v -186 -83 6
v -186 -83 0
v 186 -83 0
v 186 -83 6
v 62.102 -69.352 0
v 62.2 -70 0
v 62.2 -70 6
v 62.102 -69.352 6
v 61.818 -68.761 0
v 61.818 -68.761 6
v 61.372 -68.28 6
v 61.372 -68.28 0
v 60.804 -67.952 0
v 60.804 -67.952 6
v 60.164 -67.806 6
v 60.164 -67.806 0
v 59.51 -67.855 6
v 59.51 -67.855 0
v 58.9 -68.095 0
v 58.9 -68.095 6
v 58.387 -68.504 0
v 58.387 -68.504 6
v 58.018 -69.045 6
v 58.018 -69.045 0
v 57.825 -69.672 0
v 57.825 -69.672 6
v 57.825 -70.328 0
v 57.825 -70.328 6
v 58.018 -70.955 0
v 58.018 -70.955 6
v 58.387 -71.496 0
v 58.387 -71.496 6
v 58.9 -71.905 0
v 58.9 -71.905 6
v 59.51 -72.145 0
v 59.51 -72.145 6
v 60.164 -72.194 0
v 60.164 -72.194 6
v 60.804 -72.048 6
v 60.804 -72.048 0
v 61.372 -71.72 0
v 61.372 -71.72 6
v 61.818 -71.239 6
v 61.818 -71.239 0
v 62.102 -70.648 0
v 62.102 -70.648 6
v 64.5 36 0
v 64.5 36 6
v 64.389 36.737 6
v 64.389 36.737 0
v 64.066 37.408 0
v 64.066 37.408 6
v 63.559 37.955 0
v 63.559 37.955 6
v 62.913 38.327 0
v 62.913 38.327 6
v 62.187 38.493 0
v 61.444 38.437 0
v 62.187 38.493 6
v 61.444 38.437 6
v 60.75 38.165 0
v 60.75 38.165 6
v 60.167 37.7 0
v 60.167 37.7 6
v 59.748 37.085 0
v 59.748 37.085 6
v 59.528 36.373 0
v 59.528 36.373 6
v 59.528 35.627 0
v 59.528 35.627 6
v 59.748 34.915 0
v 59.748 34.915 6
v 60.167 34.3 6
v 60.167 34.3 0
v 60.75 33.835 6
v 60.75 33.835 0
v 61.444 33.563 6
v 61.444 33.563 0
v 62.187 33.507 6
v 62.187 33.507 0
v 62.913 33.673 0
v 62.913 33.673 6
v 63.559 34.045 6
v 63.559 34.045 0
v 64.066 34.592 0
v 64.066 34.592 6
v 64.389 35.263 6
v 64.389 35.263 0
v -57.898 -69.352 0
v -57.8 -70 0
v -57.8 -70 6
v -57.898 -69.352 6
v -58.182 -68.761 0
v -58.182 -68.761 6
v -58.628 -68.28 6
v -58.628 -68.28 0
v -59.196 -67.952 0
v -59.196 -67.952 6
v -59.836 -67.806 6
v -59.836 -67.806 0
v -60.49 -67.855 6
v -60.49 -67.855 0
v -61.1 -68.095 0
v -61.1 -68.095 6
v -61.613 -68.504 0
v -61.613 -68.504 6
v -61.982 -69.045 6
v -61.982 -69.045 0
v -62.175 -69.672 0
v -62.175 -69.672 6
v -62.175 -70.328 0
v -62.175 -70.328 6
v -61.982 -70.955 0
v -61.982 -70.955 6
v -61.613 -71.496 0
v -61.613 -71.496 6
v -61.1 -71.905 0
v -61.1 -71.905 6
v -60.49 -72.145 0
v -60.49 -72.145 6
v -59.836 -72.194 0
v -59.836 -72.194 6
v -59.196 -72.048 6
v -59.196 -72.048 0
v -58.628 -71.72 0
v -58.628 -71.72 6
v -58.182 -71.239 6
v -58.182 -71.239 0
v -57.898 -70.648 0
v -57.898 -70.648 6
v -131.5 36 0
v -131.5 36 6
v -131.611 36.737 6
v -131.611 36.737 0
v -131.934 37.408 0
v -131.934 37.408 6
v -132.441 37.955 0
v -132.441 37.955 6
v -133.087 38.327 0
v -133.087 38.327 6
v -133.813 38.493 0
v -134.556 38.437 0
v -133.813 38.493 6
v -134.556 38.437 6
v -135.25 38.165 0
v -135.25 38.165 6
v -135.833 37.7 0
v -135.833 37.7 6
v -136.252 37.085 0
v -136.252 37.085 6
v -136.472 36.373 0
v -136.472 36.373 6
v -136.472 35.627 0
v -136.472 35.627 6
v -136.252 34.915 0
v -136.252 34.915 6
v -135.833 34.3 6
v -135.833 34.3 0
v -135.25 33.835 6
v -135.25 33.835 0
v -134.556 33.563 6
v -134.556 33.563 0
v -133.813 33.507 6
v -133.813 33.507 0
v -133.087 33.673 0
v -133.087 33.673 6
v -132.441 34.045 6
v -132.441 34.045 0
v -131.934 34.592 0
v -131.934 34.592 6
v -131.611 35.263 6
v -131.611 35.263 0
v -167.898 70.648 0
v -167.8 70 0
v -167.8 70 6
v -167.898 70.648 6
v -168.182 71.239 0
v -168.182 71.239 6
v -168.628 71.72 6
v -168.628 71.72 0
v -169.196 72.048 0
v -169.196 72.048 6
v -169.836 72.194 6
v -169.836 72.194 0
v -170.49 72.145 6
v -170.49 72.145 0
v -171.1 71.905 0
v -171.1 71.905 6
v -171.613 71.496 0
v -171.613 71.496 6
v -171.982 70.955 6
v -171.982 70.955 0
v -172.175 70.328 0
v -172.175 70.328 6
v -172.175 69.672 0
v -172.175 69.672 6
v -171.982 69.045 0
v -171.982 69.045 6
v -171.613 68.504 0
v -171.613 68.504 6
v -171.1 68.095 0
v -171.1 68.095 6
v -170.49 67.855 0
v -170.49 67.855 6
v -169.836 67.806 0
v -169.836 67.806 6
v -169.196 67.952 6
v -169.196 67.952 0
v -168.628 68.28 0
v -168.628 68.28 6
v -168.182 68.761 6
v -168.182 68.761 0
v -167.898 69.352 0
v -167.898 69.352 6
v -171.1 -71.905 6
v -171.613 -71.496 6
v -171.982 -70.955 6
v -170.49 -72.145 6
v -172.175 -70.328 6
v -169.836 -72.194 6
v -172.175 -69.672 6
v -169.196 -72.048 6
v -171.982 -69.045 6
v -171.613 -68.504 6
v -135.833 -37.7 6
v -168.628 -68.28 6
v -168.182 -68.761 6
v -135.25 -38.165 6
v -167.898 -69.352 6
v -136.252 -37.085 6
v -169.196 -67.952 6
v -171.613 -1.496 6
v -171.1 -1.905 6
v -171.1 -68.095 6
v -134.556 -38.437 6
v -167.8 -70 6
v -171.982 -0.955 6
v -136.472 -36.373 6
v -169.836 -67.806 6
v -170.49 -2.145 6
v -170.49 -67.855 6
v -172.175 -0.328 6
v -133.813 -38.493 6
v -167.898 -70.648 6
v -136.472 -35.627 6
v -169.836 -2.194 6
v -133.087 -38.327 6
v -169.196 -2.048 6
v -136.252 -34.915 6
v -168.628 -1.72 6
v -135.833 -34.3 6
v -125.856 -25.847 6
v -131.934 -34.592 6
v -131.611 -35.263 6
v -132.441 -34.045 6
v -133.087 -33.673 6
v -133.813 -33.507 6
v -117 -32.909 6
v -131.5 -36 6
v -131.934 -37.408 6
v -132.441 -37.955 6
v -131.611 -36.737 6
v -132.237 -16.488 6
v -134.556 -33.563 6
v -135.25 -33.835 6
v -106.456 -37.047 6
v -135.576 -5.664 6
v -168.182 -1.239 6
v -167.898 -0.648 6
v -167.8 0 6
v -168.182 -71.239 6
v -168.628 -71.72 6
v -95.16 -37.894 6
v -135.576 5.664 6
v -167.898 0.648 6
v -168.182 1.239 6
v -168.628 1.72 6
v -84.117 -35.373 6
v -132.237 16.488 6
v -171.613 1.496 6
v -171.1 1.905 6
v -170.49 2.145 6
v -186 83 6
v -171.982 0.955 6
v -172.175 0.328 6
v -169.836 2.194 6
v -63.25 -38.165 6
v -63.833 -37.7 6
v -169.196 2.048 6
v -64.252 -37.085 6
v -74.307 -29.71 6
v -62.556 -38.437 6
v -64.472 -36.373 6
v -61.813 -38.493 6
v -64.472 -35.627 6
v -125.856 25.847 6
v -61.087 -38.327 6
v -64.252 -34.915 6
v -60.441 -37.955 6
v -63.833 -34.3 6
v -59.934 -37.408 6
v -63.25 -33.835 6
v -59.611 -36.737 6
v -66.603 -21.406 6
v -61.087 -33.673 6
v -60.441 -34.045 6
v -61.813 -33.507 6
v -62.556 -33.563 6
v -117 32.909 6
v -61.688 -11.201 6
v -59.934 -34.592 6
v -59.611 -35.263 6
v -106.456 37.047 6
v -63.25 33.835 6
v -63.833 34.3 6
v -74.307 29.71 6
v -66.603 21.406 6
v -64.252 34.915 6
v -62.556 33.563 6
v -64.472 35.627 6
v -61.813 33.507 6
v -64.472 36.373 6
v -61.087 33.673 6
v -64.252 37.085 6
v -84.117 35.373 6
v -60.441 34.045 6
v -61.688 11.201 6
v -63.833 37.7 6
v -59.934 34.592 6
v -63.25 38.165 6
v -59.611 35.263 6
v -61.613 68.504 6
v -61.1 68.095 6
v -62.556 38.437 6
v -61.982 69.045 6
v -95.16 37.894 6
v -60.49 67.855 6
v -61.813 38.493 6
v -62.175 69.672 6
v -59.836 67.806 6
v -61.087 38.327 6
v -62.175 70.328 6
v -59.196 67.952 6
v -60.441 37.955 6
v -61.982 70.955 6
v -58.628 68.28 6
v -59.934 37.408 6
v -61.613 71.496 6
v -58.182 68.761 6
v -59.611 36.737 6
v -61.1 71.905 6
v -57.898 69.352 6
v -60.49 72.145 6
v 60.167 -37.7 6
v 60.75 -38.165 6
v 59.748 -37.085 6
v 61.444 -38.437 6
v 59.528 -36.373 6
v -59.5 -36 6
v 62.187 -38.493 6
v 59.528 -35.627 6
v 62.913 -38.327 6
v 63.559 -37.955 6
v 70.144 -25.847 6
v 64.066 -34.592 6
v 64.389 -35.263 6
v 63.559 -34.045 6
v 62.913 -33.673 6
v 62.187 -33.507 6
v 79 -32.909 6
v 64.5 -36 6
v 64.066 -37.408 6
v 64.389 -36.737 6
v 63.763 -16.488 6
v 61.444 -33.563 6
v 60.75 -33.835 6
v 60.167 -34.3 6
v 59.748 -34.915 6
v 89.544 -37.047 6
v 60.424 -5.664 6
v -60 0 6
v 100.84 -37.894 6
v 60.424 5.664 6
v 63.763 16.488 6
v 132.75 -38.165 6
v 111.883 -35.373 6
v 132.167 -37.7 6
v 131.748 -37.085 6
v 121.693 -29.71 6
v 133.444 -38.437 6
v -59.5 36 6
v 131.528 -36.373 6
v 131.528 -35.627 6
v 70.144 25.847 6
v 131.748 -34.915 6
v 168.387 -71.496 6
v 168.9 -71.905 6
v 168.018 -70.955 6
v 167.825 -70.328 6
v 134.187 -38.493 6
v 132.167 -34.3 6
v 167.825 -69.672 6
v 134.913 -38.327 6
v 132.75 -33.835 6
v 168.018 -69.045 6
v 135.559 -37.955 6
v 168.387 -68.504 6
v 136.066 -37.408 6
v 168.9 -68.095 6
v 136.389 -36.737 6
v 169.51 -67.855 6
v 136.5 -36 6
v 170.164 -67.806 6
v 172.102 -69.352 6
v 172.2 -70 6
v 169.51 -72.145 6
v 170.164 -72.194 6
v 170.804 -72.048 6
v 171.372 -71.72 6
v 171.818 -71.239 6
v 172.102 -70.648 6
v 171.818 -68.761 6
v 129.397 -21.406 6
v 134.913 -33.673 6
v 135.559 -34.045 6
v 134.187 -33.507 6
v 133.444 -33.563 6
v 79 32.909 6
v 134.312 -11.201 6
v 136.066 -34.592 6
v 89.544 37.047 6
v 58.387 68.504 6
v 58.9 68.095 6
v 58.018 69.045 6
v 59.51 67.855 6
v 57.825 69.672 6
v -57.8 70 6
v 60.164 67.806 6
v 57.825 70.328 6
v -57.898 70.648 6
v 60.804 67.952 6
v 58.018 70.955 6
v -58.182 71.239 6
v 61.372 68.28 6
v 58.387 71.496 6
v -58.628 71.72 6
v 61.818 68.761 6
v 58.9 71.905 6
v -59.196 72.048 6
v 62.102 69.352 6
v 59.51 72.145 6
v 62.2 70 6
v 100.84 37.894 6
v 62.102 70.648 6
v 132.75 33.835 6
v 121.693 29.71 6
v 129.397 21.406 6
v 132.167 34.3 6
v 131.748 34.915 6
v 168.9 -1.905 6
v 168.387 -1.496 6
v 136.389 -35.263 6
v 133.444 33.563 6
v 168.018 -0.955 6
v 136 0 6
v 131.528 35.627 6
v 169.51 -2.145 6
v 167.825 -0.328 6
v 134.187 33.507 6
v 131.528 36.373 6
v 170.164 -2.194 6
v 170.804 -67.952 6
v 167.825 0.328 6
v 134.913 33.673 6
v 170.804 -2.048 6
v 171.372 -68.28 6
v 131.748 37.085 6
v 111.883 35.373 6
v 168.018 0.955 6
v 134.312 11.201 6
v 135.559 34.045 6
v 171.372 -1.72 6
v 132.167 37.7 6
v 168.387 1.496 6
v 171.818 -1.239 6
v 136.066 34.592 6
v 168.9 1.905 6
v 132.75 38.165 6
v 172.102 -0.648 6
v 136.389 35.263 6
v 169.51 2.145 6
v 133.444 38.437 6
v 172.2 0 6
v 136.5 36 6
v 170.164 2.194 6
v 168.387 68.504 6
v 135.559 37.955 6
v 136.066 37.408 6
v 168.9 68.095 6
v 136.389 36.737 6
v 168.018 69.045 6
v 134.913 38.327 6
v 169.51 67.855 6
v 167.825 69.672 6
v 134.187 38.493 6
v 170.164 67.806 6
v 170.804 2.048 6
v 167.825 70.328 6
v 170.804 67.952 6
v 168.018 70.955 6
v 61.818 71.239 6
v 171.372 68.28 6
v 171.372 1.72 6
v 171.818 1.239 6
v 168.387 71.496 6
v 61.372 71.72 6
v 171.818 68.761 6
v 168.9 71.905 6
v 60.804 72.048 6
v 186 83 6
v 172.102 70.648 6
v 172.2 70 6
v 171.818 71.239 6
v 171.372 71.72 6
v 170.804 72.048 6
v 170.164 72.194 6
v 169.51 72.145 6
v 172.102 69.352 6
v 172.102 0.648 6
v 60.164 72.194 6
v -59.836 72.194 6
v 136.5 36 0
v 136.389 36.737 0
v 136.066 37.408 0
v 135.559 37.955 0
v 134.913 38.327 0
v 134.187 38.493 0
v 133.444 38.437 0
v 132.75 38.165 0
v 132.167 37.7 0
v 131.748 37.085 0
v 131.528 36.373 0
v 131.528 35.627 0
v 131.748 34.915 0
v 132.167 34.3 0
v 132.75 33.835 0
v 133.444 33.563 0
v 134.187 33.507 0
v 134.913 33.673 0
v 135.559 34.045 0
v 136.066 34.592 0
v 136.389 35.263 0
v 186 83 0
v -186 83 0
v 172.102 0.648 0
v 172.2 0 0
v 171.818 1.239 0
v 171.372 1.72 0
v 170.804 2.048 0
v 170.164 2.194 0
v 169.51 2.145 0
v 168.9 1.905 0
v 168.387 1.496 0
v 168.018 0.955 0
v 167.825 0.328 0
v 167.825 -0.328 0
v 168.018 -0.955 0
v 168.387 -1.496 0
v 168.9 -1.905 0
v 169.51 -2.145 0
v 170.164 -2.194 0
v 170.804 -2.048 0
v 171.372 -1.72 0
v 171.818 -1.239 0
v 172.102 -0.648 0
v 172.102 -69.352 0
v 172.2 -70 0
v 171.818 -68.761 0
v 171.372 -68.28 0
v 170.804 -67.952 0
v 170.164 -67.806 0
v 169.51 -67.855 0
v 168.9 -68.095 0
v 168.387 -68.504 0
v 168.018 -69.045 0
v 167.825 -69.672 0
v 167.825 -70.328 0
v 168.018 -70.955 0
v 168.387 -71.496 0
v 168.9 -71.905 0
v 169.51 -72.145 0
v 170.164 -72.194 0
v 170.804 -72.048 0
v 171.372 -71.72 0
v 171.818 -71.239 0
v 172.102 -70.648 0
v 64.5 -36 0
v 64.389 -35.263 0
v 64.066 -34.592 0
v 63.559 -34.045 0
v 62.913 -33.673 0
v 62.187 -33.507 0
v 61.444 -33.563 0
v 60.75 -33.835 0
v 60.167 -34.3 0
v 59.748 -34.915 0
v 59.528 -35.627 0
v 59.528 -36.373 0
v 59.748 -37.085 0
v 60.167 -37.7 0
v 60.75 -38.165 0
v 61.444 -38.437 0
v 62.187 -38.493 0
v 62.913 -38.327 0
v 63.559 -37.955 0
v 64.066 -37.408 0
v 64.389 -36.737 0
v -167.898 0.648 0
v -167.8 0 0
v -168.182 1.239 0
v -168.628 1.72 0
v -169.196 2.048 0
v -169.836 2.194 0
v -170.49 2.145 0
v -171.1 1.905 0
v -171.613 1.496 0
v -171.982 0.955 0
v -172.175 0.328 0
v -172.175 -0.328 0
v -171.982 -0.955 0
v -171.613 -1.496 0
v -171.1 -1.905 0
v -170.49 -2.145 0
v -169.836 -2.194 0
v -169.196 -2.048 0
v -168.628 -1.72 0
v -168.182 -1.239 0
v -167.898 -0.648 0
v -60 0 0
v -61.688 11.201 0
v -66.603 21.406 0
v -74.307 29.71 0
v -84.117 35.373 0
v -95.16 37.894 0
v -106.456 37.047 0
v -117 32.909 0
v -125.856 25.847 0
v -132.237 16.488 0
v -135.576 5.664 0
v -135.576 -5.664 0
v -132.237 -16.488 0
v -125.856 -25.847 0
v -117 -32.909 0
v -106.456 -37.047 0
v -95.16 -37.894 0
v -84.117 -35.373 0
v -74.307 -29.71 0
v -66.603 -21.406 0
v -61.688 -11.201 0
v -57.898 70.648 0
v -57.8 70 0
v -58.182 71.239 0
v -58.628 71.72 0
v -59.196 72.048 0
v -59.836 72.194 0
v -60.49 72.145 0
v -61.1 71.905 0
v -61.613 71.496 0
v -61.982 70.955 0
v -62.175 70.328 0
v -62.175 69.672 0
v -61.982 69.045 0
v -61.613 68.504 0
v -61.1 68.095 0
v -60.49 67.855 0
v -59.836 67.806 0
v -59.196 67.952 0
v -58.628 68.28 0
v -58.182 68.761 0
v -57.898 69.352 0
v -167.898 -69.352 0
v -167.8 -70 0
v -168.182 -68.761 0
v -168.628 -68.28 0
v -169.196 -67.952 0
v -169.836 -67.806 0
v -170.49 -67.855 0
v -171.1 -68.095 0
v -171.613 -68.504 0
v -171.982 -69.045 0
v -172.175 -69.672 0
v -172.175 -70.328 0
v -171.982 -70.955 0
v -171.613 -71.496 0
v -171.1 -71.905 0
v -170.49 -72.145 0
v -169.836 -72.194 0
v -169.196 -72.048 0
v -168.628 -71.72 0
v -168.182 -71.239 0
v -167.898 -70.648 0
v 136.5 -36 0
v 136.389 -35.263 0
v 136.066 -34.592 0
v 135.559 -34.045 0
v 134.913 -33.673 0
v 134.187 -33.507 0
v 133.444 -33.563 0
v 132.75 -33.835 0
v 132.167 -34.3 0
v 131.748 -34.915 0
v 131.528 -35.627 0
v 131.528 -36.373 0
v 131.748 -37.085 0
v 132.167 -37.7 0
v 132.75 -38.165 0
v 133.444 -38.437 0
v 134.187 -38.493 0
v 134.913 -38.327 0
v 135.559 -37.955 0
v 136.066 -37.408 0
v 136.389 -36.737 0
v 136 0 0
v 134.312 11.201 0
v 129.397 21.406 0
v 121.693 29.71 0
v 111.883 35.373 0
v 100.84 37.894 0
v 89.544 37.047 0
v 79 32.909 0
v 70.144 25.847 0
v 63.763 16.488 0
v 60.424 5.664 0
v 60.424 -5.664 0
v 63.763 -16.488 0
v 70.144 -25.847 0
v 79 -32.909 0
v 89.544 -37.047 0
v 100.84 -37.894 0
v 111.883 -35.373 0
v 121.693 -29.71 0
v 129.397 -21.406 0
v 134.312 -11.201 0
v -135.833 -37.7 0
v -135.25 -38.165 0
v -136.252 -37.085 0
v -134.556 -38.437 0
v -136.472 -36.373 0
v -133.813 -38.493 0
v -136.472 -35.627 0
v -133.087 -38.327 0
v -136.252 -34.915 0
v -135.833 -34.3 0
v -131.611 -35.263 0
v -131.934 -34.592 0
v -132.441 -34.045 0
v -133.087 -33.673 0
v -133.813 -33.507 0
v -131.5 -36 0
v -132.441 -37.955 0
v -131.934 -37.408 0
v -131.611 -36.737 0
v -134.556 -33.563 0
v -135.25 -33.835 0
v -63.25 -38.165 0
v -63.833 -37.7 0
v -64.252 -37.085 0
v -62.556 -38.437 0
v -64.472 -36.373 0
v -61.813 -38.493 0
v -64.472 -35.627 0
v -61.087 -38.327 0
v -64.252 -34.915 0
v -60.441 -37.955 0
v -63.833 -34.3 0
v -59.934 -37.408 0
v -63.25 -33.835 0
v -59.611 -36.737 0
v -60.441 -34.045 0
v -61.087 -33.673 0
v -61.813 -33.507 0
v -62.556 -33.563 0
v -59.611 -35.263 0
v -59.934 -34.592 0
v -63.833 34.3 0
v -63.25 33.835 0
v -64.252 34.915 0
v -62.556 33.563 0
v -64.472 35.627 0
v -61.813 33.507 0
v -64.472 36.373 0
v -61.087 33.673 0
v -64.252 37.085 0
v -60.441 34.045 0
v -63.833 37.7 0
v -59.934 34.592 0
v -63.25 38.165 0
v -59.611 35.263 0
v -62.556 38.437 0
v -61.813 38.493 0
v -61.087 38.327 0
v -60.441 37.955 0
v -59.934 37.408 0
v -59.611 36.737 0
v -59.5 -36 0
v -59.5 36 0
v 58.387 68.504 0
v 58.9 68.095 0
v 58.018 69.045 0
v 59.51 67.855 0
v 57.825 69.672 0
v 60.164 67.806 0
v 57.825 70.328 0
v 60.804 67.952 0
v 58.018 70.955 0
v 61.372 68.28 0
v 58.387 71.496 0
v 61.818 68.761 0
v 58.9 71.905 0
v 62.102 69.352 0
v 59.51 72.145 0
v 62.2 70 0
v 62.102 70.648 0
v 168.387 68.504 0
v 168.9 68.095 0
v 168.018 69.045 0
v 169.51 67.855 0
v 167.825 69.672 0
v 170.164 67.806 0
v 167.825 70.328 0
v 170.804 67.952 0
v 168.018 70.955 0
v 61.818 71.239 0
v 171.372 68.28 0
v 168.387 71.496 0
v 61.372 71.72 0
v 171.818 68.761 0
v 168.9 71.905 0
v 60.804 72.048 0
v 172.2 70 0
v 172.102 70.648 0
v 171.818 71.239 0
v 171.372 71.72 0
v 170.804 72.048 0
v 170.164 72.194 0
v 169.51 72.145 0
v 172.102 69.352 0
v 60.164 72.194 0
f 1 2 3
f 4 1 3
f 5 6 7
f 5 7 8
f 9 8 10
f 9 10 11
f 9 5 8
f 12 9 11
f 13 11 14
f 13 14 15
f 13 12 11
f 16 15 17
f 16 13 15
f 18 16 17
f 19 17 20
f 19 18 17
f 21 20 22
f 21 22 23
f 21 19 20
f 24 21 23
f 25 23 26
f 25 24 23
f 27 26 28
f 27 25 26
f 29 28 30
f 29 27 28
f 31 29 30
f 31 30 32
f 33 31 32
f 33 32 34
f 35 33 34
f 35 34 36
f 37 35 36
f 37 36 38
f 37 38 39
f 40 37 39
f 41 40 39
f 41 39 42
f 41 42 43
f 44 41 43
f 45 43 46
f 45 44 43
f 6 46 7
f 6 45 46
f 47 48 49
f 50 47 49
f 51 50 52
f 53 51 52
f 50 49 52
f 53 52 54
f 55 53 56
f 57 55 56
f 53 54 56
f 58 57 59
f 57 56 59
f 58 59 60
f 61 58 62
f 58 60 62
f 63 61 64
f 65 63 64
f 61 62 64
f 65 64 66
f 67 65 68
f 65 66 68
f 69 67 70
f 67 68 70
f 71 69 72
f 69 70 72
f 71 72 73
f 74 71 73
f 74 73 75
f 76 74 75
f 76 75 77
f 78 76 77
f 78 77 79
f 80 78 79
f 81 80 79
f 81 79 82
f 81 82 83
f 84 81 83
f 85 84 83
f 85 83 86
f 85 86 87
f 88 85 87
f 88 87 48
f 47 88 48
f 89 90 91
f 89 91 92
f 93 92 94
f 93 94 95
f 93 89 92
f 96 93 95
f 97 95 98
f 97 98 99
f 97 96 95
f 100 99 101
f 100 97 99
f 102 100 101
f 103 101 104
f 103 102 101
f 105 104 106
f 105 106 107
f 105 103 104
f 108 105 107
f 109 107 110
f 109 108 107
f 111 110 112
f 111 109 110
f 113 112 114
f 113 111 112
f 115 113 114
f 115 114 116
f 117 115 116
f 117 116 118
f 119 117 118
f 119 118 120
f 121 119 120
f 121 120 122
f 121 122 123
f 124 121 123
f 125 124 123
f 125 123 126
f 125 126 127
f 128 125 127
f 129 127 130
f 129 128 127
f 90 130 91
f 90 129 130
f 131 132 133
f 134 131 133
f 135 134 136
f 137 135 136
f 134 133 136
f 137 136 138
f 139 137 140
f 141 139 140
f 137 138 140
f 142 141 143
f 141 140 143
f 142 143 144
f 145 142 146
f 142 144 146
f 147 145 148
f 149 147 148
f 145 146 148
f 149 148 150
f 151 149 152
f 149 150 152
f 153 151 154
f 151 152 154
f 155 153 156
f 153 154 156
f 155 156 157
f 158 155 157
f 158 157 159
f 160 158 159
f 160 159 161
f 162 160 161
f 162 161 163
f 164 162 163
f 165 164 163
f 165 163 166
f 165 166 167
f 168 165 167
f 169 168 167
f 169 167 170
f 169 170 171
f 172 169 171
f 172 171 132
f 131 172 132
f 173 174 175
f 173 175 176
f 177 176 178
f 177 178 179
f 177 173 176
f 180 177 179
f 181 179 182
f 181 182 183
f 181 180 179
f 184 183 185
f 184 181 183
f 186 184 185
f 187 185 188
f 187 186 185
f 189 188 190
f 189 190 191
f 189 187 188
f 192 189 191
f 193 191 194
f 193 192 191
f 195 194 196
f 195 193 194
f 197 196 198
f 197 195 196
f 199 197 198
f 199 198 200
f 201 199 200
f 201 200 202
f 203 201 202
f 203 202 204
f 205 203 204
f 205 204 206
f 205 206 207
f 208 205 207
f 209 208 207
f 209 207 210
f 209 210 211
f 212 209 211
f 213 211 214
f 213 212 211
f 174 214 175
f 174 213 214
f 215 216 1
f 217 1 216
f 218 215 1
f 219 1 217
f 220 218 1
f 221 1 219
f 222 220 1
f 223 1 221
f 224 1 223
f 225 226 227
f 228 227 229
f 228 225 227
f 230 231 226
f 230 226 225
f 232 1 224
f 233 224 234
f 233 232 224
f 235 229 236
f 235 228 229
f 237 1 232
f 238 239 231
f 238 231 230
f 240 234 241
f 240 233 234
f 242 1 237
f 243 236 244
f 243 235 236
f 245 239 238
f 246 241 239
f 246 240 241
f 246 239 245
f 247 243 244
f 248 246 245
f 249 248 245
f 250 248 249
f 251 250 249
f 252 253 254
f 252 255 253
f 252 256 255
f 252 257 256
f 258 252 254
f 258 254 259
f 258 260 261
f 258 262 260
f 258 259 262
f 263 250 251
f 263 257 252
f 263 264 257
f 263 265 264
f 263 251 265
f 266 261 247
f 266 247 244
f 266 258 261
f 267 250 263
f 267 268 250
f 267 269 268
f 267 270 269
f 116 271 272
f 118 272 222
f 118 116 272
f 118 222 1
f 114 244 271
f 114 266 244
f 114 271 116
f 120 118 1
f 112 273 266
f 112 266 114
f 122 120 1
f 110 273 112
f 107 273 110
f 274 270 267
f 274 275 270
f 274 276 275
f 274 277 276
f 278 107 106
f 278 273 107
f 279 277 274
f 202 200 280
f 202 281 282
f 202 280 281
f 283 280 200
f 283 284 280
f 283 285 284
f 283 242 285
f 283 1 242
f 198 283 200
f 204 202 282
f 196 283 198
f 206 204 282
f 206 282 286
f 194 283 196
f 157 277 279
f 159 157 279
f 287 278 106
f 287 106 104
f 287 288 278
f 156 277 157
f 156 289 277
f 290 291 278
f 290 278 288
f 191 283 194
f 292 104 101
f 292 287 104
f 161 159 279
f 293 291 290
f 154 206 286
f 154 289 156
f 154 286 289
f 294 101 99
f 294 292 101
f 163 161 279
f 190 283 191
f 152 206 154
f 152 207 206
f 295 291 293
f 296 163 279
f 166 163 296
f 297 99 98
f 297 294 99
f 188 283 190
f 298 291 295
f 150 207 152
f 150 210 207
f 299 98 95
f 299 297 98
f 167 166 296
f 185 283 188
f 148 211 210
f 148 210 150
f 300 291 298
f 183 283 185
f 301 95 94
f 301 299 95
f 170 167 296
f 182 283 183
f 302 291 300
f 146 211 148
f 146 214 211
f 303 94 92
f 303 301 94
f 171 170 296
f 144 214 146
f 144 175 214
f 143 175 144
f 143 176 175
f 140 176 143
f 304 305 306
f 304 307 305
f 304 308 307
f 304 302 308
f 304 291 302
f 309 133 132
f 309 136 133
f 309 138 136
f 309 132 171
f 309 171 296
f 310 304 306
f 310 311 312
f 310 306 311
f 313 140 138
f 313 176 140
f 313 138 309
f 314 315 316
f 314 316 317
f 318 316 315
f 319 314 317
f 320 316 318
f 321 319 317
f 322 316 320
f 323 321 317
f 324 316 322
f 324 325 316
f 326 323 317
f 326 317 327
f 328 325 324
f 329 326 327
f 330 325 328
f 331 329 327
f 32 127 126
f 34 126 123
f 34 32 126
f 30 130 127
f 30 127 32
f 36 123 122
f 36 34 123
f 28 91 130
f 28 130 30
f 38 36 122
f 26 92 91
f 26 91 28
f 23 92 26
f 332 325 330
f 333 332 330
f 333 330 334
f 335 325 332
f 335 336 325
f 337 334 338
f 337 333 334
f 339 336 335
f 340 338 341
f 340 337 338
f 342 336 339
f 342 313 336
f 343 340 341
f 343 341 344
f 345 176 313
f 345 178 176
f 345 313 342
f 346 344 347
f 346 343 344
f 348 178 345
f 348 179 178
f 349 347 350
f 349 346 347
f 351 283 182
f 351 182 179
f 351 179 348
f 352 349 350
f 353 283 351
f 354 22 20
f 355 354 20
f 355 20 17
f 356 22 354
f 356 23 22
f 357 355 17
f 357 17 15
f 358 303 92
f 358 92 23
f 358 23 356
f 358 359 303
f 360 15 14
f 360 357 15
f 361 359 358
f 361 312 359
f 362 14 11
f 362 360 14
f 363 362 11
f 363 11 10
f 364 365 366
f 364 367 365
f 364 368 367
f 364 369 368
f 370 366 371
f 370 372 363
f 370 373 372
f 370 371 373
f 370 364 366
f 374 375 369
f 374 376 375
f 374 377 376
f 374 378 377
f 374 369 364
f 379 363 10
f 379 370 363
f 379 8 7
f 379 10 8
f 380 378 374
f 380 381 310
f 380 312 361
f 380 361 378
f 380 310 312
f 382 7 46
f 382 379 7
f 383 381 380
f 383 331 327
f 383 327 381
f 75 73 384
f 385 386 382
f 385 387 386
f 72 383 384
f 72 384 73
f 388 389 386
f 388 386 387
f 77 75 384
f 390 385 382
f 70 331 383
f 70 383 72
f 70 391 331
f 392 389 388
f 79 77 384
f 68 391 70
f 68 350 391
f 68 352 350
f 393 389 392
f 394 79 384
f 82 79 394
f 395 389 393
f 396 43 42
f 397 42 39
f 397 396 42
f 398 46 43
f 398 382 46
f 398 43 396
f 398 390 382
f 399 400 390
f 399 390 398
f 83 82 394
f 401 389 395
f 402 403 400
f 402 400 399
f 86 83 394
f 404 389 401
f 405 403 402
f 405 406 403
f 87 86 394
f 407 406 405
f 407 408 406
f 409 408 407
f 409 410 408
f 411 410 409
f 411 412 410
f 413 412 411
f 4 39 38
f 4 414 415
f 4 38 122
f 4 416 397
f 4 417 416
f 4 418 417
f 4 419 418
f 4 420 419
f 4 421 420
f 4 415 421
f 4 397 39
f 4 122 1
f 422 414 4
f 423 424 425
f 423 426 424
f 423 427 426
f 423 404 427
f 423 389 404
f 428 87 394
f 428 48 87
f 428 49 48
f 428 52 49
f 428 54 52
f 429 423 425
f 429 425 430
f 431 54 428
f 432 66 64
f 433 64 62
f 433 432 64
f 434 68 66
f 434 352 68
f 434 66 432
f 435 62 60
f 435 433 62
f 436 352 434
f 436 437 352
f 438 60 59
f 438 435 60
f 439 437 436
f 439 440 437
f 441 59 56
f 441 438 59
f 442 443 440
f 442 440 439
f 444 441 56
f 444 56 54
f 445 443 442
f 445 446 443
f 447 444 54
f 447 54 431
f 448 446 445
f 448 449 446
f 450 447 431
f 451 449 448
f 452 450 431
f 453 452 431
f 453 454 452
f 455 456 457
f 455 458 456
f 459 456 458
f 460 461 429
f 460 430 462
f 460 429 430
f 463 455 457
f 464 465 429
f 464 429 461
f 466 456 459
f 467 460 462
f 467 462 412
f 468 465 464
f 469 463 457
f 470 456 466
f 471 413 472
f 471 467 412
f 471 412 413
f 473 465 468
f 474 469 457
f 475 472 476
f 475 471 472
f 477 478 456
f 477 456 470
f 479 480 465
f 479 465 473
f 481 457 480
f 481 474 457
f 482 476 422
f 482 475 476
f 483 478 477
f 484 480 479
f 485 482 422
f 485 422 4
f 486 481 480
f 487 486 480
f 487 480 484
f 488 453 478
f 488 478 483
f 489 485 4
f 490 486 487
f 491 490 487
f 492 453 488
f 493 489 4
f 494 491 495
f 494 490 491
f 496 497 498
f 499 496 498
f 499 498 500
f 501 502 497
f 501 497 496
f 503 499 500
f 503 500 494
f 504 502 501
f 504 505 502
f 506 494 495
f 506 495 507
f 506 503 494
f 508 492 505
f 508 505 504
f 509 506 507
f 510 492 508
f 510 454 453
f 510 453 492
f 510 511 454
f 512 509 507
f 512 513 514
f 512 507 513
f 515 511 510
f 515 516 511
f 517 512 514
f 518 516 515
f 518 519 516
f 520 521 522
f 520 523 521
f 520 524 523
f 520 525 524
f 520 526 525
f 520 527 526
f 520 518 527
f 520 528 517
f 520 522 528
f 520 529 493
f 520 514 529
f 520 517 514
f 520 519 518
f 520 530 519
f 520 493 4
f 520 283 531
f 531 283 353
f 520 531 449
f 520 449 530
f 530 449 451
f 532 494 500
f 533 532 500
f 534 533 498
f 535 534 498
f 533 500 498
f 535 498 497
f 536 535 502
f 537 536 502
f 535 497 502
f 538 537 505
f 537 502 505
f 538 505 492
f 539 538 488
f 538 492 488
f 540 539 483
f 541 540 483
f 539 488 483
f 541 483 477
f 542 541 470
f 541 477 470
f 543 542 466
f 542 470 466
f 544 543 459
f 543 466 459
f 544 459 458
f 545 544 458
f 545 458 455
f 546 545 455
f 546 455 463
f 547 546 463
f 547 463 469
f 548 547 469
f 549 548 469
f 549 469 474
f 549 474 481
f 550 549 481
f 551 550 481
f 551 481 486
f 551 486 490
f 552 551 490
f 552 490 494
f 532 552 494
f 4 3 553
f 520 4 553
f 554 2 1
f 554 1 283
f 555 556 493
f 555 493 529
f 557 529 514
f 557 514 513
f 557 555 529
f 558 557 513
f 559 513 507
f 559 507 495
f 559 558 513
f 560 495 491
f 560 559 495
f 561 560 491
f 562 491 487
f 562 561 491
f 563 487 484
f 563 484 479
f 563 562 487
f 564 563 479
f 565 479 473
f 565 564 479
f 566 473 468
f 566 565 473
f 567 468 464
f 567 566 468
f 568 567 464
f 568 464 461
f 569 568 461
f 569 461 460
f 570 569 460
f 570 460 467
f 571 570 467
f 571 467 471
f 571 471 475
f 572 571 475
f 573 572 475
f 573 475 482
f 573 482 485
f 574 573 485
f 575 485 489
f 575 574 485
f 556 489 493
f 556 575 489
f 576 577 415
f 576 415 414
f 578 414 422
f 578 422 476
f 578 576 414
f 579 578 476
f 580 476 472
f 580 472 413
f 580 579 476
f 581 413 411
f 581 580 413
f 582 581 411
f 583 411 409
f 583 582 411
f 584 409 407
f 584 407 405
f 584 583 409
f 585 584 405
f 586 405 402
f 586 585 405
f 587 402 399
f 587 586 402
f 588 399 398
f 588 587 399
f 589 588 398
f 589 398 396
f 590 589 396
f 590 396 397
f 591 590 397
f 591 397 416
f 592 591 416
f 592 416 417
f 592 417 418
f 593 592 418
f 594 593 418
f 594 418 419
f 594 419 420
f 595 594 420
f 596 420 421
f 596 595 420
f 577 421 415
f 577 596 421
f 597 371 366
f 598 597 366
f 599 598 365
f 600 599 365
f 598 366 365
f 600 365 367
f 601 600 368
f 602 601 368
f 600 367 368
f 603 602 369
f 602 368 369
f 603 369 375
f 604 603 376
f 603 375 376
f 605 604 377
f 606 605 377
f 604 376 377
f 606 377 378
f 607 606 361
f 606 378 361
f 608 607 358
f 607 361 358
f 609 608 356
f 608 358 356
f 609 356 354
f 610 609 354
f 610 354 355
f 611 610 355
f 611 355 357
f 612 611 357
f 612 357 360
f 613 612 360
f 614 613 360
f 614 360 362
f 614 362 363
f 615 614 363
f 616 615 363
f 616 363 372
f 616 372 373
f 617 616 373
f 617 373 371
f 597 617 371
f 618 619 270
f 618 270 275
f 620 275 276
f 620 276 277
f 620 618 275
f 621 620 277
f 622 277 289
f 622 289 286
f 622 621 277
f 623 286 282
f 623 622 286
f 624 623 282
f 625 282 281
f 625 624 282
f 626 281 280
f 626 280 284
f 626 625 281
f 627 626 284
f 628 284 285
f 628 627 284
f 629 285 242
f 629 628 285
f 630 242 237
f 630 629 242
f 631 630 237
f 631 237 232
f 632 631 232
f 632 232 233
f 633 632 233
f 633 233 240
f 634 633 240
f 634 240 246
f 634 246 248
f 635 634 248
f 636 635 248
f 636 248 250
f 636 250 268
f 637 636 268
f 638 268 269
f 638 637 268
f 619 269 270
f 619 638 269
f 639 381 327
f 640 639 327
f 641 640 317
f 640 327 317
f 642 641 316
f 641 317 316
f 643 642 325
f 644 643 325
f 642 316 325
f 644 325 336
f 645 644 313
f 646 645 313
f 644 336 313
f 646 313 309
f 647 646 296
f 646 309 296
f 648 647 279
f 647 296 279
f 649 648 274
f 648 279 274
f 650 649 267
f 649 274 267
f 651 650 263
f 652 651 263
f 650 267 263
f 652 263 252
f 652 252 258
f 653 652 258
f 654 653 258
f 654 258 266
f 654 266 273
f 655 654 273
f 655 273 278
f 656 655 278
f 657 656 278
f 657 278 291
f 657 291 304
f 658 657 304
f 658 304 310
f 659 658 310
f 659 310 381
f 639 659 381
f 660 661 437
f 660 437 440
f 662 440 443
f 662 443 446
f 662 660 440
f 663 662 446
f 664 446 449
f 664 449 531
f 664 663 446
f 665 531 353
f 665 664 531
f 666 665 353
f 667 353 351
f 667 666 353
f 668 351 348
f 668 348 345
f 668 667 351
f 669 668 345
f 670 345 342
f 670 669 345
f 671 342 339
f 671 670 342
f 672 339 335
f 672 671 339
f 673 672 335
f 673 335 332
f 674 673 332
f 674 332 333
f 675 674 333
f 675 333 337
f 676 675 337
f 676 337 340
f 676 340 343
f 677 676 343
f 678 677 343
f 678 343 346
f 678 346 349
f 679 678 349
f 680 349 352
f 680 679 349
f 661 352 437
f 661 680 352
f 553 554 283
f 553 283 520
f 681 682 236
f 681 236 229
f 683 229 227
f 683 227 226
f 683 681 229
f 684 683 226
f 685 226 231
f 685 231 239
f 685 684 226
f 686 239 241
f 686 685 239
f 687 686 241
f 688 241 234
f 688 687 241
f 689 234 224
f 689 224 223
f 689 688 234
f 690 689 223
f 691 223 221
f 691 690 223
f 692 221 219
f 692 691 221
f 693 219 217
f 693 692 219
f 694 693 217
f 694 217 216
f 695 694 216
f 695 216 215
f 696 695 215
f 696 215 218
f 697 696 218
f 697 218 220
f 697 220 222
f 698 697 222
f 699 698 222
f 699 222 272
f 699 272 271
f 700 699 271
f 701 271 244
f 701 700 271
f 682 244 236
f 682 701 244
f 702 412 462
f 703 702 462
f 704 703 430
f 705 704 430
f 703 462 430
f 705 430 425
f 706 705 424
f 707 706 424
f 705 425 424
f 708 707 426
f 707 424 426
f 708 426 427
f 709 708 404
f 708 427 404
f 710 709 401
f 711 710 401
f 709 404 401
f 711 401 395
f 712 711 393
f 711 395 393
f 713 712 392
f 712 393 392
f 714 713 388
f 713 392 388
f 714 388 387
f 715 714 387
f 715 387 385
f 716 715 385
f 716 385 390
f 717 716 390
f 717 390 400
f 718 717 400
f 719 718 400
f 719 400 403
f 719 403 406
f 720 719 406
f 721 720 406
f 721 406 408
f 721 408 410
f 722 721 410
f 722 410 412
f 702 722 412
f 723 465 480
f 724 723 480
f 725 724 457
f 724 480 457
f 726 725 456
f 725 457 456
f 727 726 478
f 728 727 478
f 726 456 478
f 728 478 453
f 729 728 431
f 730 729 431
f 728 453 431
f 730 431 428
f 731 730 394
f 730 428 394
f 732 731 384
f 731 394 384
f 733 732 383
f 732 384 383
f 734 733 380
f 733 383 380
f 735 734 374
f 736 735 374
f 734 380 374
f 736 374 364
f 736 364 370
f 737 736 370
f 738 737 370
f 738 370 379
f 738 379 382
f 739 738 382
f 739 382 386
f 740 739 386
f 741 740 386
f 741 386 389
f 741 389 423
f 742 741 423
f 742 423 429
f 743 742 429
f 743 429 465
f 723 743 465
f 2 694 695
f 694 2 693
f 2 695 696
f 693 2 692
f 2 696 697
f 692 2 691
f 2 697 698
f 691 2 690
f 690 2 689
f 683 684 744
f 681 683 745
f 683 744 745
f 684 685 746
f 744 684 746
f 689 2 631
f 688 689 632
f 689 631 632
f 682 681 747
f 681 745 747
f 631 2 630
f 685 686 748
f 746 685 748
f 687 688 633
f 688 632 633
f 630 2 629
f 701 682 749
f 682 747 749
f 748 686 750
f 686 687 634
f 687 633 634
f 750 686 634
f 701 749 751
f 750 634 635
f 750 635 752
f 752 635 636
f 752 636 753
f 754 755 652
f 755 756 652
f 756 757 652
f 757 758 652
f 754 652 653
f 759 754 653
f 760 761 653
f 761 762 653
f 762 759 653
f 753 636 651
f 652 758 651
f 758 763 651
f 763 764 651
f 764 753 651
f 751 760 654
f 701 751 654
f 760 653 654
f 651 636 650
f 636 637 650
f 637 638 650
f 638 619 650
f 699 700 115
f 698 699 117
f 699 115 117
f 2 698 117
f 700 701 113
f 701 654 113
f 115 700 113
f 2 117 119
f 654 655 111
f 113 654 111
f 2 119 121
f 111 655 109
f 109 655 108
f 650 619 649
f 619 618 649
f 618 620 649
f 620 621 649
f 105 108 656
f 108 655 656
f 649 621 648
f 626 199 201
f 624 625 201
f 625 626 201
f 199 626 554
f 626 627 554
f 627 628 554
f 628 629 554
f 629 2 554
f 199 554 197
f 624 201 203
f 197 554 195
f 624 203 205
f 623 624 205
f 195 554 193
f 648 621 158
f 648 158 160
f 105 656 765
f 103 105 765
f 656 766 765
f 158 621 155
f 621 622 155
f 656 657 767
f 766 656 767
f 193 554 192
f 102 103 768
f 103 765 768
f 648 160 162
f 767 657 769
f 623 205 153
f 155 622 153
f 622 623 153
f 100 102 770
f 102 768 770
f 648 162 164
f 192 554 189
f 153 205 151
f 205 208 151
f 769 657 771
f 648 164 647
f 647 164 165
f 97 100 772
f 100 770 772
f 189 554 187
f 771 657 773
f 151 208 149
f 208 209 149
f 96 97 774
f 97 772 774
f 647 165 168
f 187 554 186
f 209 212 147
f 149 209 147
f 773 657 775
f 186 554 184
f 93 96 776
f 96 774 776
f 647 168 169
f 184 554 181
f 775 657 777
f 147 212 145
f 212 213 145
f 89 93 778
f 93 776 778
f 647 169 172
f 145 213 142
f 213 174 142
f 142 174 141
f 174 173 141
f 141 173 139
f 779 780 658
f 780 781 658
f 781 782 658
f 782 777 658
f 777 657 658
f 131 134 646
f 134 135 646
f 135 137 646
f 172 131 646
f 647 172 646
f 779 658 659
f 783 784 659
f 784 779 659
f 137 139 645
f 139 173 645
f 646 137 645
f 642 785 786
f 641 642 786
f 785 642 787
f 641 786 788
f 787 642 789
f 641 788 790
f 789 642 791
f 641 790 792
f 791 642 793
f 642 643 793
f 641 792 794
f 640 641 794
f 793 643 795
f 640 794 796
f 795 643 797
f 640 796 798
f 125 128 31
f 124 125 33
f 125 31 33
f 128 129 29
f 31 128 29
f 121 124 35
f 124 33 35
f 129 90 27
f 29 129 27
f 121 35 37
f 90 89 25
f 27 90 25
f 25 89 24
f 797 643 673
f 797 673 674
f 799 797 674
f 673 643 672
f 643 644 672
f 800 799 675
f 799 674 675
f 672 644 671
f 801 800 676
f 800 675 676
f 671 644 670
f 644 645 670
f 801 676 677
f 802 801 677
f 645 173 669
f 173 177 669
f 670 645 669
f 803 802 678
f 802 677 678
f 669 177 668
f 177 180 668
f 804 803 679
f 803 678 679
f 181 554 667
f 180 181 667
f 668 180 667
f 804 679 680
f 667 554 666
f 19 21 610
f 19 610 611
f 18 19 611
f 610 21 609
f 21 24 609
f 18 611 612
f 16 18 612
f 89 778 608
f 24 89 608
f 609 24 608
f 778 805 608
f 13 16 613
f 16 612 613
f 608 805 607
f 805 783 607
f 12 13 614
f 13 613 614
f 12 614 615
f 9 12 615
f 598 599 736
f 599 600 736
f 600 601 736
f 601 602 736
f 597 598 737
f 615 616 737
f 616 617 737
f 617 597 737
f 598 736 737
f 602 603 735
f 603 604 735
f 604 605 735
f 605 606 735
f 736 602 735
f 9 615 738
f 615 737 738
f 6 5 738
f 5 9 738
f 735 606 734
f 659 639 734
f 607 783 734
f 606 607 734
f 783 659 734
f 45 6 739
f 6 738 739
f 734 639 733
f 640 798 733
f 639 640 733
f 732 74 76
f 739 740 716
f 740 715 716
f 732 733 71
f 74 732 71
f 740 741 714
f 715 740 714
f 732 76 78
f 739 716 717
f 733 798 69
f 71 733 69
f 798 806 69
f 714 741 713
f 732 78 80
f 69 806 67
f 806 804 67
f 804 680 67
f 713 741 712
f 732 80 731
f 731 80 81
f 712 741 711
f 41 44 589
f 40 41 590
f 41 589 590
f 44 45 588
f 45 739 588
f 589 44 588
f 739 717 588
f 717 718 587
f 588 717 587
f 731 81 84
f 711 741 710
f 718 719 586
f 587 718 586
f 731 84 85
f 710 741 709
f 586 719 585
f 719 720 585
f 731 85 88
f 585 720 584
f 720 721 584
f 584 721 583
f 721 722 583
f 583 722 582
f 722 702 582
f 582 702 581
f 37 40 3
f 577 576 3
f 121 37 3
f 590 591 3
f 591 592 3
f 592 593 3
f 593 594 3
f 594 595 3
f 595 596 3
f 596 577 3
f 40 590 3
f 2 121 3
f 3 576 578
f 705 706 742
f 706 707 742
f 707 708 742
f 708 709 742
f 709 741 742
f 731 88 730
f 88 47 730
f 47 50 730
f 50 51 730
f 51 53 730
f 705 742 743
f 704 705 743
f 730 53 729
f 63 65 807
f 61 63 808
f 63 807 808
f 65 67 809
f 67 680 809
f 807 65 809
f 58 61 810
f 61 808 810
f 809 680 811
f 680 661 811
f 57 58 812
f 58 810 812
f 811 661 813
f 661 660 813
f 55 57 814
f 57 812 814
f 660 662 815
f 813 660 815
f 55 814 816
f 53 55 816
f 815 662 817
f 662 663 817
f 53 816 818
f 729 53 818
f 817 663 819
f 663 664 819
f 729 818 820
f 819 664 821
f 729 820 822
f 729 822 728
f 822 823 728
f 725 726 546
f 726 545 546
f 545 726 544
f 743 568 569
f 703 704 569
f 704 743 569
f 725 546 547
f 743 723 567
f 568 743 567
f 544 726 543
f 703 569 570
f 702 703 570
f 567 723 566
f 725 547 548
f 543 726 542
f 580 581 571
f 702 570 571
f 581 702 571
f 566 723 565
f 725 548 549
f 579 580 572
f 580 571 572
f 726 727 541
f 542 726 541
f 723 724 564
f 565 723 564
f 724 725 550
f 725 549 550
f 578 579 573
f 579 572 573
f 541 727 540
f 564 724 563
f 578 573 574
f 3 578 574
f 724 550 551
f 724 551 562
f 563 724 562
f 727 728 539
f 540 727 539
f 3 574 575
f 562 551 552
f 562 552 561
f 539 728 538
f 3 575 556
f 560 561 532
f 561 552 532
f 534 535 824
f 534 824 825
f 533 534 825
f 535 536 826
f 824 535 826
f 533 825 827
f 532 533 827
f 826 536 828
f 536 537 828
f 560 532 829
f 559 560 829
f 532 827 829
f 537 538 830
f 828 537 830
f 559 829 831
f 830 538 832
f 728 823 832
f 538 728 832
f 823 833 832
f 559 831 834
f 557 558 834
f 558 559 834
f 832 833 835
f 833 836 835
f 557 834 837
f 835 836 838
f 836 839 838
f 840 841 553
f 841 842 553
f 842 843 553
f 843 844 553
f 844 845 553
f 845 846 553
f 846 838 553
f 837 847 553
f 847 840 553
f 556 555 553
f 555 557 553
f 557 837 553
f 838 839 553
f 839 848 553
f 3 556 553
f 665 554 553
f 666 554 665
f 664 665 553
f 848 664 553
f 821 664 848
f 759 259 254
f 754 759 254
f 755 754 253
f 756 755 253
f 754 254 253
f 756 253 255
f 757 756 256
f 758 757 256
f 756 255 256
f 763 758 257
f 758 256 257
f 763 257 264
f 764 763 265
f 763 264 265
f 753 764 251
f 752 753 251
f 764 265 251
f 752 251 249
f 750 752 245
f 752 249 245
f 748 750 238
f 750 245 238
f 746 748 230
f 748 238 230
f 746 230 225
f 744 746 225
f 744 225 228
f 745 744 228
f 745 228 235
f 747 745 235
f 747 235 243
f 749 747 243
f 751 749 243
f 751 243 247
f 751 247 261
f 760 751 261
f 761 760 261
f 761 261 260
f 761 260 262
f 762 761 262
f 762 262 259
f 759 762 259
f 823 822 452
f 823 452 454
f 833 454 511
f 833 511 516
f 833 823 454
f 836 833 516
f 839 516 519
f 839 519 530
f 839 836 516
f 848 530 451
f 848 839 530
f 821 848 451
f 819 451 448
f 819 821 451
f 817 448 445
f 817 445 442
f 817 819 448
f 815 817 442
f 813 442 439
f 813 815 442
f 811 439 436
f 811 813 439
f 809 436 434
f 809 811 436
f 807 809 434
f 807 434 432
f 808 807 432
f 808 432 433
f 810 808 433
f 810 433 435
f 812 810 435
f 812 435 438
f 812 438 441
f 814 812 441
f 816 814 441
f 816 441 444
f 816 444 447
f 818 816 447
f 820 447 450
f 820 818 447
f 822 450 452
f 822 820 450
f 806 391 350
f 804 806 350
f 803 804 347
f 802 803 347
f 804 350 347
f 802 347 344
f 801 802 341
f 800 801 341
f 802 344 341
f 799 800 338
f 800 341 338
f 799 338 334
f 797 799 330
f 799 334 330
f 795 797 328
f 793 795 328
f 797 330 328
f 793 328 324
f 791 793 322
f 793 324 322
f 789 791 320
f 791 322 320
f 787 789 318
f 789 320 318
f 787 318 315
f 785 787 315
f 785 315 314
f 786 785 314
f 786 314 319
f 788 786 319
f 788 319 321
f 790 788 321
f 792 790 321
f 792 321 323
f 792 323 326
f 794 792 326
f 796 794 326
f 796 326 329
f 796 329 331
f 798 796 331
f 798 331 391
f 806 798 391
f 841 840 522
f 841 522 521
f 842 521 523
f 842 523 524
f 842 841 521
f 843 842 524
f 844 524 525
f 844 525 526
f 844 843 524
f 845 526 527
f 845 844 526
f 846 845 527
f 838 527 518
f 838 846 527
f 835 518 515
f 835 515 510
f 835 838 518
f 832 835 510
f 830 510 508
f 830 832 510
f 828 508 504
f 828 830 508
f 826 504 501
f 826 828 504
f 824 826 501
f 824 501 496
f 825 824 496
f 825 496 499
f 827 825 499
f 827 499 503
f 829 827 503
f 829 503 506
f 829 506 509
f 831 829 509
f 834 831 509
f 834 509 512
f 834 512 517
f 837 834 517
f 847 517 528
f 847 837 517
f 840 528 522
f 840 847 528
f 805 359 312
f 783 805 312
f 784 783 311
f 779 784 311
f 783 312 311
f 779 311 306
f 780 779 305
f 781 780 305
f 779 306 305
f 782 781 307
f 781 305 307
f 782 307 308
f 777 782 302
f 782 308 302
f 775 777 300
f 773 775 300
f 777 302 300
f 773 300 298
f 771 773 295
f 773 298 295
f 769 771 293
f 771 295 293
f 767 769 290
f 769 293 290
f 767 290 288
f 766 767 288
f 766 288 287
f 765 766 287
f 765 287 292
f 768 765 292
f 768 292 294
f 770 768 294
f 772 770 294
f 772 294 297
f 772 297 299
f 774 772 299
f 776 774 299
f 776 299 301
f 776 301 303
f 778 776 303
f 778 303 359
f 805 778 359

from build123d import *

# Parameters (mm, degrees)
ESQUISSE1_W             = 372
ESQUISSE1_H             = 166
ESQUISSE1_R             = 2.2
BOSS_EXTRU_1_DEPTH      = 6
ESQUISSE2_R             = 38
ESQUISSE2_R_2           = 2.5
ENL_V_MAT_EXTRU_1_DEPTH = 7


with BuildPart() as part:
    # Esquisse1 → Boss.-Extru.1 (new body)
    with BuildSketch(Plane.XY):
        Rectangle(ESQUISSE1_W, ESQUISSE1_H)
        with Locations((-170, 70)):
            Circle(ESQUISSE1_R, mode=Mode.SUBTRACT)
        with Locations((-60, 70)):
            Circle(ESQUISSE1_R, mode=Mode.SUBTRACT)
        with Locations((60, 70)):
            Circle(ESQUISSE1_R, mode=Mode.SUBTRACT)
        with Locations((170, 70)):
            Circle(ESQUISSE1_R, mode=Mode.SUBTRACT)
        with Locations((170, -70)):
            Circle(ESQUISSE1_R, mode=Mode.SUBTRACT)
        with Locations((60, -70)):
            Circle(ESQUISSE1_R, mode=Mode.SUBTRACT)
        with Locations((-60, -70)):
            Circle(ESQUISSE1_R, mode=Mode.SUBTRACT)
        with Locations((-170, -70)):
            Circle(ESQUISSE1_R, mode=Mode.SUBTRACT)
        with Locations((-170, 0)):
            Circle(ESQUISSE1_R, mode=Mode.SUBTRACT)
        with Locations((170, 0)):
            Circle(ESQUISSE1_R, mode=Mode.SUBTRACT)
    extrude(amount=BOSS_EXTRU_1_DEPTH)

    # Esquisse2 → Enlèv. mat.-Extru.1 (cut, through all)
    with BuildSketch(Plane.XY.offset(6)):
        with Locations((-98, 0)):
            Circle(ESQUISSE2_R)
        with Locations((-134, 36)):
            Circle(ESQUISSE2_R_2)
        with Locations((-134, -36)):
            Circle(ESQUISSE2_R_2)
        with Locations((-62, -36)):
            Circle(ESQUISSE2_R_2)
        with Locations((-62, 36)):
            Circle(ESQUISSE2_R_2)
        with Locations((62, 36)):
            Circle(ESQUISSE2_R_2)
        with Locations((62, -36)):
            Circle(ESQUISSE2_R_2)
        with Locations((134, -36)):
            Circle(ESQUISSE2_R_2)
        with Locations((134, 36)):
            Circle(ESQUISSE2_R_2)
        with Locations((98, 0)):
            Circle(ESQUISSE2_R)
    extrude(amount=-ENL_V_MAT_EXTRU_1_DEPTH, mode=Mode.SUBTRACT)


solid = part.part
